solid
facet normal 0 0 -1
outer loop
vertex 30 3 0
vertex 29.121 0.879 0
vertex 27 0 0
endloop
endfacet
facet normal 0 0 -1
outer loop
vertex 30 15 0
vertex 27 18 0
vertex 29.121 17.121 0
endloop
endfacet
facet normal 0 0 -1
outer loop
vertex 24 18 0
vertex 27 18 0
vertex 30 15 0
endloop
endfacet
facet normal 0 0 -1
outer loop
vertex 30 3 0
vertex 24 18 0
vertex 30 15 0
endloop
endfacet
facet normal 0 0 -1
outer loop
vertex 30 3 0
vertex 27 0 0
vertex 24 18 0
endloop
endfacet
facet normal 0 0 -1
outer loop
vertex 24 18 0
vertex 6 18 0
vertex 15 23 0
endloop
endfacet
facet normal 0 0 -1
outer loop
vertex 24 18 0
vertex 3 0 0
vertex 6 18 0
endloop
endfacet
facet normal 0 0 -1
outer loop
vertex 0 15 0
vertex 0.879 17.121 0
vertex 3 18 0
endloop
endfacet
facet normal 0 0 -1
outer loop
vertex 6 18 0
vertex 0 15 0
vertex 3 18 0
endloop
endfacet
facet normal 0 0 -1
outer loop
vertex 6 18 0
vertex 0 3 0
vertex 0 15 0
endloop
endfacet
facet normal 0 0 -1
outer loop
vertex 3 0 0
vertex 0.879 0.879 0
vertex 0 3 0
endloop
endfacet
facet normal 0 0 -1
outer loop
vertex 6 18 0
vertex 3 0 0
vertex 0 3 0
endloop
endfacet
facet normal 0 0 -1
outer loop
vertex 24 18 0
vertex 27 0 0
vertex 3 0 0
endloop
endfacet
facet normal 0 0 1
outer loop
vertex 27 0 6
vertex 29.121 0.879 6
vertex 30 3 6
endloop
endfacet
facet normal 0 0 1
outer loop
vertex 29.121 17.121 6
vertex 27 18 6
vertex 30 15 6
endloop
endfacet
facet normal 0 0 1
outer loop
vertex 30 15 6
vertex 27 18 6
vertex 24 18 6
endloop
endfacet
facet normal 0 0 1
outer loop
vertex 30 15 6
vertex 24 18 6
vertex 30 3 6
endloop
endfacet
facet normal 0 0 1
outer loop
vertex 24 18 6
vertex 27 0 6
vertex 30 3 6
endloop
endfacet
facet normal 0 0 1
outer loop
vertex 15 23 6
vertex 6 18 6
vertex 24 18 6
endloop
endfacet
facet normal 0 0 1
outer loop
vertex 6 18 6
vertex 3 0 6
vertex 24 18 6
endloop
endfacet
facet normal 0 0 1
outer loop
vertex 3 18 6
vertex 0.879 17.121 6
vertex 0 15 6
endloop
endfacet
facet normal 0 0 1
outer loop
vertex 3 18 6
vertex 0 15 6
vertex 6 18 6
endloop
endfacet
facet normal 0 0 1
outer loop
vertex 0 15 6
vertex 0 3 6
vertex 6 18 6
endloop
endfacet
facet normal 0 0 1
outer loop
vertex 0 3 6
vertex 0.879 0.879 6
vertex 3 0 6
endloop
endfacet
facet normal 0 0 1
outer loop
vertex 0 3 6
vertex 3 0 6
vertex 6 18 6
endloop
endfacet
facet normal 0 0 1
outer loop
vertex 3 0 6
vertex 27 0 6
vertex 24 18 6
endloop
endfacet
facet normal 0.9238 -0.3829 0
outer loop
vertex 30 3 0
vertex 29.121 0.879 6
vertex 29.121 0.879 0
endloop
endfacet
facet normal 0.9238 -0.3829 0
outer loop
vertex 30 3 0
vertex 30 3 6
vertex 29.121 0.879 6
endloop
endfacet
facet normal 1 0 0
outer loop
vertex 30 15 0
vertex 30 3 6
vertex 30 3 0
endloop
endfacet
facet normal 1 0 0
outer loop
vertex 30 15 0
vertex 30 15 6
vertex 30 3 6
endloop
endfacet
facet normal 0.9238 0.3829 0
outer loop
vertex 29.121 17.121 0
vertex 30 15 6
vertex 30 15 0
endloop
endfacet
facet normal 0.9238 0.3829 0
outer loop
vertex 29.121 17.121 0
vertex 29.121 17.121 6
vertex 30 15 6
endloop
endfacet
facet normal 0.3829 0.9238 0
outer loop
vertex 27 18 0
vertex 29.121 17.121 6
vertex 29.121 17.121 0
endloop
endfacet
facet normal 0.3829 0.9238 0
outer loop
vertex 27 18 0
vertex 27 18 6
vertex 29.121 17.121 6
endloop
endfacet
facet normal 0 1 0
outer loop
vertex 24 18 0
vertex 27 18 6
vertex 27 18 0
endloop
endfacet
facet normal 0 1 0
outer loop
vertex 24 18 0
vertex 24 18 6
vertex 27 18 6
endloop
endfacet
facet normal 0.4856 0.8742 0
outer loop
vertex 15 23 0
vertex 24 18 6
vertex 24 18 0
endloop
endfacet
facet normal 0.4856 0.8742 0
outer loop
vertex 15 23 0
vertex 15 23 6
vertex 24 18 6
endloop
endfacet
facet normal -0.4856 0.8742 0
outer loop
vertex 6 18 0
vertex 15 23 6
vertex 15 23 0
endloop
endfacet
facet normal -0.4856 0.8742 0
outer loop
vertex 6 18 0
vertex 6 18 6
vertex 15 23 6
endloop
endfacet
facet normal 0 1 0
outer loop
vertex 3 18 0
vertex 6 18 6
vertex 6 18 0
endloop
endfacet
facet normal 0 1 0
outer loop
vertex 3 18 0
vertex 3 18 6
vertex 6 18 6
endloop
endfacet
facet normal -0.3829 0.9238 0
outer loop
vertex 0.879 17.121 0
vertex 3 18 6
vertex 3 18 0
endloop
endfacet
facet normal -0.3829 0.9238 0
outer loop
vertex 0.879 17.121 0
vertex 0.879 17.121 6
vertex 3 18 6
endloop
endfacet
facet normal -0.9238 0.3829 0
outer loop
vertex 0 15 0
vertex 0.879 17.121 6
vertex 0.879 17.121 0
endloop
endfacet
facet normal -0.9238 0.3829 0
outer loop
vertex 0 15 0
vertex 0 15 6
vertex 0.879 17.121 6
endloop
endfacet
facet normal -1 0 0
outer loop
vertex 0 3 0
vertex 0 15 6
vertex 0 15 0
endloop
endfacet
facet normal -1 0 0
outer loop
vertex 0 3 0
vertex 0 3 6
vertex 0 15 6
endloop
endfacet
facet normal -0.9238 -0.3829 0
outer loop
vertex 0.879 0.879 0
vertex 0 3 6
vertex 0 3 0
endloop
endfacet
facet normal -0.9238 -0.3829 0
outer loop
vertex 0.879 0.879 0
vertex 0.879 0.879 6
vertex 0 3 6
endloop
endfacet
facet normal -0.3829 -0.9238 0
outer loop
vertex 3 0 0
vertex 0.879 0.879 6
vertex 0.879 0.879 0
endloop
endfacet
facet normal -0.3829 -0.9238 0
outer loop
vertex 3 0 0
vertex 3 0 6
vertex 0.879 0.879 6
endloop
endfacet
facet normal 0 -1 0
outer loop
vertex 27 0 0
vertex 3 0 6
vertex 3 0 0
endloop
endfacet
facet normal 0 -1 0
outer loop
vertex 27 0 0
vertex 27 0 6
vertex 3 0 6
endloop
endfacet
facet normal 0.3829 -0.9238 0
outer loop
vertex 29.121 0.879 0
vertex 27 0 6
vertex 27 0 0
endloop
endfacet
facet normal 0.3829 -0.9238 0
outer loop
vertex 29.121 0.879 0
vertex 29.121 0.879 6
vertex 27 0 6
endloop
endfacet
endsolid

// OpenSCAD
$fn = 32;

// ----------------------------------------------------------------------
// Ratchet pawl: 30 x 18 mm body, beak 5 mm сверху
// ----------------------------------------------------------------------

// --- parameters (mm) ---
profile_height = 6;       // extrusion height
profile_points = 15;      // points of the closed outline

profile = [[0, 3], [0.879, 0.879], [3, 0], [27, 0], [29.121, 0.879], [30, 3], [30, 15], [29.121, 17.121], [27, 18], [24, 18], [15, 23], [6, 18], [3, 18], [0.879, 17.121], [0, 15]];  // single closed polygon, 15 points, counter clockwise

// --- the one profile operation ---
linear_extrude(height = profile_height) polygon(points = profile);
